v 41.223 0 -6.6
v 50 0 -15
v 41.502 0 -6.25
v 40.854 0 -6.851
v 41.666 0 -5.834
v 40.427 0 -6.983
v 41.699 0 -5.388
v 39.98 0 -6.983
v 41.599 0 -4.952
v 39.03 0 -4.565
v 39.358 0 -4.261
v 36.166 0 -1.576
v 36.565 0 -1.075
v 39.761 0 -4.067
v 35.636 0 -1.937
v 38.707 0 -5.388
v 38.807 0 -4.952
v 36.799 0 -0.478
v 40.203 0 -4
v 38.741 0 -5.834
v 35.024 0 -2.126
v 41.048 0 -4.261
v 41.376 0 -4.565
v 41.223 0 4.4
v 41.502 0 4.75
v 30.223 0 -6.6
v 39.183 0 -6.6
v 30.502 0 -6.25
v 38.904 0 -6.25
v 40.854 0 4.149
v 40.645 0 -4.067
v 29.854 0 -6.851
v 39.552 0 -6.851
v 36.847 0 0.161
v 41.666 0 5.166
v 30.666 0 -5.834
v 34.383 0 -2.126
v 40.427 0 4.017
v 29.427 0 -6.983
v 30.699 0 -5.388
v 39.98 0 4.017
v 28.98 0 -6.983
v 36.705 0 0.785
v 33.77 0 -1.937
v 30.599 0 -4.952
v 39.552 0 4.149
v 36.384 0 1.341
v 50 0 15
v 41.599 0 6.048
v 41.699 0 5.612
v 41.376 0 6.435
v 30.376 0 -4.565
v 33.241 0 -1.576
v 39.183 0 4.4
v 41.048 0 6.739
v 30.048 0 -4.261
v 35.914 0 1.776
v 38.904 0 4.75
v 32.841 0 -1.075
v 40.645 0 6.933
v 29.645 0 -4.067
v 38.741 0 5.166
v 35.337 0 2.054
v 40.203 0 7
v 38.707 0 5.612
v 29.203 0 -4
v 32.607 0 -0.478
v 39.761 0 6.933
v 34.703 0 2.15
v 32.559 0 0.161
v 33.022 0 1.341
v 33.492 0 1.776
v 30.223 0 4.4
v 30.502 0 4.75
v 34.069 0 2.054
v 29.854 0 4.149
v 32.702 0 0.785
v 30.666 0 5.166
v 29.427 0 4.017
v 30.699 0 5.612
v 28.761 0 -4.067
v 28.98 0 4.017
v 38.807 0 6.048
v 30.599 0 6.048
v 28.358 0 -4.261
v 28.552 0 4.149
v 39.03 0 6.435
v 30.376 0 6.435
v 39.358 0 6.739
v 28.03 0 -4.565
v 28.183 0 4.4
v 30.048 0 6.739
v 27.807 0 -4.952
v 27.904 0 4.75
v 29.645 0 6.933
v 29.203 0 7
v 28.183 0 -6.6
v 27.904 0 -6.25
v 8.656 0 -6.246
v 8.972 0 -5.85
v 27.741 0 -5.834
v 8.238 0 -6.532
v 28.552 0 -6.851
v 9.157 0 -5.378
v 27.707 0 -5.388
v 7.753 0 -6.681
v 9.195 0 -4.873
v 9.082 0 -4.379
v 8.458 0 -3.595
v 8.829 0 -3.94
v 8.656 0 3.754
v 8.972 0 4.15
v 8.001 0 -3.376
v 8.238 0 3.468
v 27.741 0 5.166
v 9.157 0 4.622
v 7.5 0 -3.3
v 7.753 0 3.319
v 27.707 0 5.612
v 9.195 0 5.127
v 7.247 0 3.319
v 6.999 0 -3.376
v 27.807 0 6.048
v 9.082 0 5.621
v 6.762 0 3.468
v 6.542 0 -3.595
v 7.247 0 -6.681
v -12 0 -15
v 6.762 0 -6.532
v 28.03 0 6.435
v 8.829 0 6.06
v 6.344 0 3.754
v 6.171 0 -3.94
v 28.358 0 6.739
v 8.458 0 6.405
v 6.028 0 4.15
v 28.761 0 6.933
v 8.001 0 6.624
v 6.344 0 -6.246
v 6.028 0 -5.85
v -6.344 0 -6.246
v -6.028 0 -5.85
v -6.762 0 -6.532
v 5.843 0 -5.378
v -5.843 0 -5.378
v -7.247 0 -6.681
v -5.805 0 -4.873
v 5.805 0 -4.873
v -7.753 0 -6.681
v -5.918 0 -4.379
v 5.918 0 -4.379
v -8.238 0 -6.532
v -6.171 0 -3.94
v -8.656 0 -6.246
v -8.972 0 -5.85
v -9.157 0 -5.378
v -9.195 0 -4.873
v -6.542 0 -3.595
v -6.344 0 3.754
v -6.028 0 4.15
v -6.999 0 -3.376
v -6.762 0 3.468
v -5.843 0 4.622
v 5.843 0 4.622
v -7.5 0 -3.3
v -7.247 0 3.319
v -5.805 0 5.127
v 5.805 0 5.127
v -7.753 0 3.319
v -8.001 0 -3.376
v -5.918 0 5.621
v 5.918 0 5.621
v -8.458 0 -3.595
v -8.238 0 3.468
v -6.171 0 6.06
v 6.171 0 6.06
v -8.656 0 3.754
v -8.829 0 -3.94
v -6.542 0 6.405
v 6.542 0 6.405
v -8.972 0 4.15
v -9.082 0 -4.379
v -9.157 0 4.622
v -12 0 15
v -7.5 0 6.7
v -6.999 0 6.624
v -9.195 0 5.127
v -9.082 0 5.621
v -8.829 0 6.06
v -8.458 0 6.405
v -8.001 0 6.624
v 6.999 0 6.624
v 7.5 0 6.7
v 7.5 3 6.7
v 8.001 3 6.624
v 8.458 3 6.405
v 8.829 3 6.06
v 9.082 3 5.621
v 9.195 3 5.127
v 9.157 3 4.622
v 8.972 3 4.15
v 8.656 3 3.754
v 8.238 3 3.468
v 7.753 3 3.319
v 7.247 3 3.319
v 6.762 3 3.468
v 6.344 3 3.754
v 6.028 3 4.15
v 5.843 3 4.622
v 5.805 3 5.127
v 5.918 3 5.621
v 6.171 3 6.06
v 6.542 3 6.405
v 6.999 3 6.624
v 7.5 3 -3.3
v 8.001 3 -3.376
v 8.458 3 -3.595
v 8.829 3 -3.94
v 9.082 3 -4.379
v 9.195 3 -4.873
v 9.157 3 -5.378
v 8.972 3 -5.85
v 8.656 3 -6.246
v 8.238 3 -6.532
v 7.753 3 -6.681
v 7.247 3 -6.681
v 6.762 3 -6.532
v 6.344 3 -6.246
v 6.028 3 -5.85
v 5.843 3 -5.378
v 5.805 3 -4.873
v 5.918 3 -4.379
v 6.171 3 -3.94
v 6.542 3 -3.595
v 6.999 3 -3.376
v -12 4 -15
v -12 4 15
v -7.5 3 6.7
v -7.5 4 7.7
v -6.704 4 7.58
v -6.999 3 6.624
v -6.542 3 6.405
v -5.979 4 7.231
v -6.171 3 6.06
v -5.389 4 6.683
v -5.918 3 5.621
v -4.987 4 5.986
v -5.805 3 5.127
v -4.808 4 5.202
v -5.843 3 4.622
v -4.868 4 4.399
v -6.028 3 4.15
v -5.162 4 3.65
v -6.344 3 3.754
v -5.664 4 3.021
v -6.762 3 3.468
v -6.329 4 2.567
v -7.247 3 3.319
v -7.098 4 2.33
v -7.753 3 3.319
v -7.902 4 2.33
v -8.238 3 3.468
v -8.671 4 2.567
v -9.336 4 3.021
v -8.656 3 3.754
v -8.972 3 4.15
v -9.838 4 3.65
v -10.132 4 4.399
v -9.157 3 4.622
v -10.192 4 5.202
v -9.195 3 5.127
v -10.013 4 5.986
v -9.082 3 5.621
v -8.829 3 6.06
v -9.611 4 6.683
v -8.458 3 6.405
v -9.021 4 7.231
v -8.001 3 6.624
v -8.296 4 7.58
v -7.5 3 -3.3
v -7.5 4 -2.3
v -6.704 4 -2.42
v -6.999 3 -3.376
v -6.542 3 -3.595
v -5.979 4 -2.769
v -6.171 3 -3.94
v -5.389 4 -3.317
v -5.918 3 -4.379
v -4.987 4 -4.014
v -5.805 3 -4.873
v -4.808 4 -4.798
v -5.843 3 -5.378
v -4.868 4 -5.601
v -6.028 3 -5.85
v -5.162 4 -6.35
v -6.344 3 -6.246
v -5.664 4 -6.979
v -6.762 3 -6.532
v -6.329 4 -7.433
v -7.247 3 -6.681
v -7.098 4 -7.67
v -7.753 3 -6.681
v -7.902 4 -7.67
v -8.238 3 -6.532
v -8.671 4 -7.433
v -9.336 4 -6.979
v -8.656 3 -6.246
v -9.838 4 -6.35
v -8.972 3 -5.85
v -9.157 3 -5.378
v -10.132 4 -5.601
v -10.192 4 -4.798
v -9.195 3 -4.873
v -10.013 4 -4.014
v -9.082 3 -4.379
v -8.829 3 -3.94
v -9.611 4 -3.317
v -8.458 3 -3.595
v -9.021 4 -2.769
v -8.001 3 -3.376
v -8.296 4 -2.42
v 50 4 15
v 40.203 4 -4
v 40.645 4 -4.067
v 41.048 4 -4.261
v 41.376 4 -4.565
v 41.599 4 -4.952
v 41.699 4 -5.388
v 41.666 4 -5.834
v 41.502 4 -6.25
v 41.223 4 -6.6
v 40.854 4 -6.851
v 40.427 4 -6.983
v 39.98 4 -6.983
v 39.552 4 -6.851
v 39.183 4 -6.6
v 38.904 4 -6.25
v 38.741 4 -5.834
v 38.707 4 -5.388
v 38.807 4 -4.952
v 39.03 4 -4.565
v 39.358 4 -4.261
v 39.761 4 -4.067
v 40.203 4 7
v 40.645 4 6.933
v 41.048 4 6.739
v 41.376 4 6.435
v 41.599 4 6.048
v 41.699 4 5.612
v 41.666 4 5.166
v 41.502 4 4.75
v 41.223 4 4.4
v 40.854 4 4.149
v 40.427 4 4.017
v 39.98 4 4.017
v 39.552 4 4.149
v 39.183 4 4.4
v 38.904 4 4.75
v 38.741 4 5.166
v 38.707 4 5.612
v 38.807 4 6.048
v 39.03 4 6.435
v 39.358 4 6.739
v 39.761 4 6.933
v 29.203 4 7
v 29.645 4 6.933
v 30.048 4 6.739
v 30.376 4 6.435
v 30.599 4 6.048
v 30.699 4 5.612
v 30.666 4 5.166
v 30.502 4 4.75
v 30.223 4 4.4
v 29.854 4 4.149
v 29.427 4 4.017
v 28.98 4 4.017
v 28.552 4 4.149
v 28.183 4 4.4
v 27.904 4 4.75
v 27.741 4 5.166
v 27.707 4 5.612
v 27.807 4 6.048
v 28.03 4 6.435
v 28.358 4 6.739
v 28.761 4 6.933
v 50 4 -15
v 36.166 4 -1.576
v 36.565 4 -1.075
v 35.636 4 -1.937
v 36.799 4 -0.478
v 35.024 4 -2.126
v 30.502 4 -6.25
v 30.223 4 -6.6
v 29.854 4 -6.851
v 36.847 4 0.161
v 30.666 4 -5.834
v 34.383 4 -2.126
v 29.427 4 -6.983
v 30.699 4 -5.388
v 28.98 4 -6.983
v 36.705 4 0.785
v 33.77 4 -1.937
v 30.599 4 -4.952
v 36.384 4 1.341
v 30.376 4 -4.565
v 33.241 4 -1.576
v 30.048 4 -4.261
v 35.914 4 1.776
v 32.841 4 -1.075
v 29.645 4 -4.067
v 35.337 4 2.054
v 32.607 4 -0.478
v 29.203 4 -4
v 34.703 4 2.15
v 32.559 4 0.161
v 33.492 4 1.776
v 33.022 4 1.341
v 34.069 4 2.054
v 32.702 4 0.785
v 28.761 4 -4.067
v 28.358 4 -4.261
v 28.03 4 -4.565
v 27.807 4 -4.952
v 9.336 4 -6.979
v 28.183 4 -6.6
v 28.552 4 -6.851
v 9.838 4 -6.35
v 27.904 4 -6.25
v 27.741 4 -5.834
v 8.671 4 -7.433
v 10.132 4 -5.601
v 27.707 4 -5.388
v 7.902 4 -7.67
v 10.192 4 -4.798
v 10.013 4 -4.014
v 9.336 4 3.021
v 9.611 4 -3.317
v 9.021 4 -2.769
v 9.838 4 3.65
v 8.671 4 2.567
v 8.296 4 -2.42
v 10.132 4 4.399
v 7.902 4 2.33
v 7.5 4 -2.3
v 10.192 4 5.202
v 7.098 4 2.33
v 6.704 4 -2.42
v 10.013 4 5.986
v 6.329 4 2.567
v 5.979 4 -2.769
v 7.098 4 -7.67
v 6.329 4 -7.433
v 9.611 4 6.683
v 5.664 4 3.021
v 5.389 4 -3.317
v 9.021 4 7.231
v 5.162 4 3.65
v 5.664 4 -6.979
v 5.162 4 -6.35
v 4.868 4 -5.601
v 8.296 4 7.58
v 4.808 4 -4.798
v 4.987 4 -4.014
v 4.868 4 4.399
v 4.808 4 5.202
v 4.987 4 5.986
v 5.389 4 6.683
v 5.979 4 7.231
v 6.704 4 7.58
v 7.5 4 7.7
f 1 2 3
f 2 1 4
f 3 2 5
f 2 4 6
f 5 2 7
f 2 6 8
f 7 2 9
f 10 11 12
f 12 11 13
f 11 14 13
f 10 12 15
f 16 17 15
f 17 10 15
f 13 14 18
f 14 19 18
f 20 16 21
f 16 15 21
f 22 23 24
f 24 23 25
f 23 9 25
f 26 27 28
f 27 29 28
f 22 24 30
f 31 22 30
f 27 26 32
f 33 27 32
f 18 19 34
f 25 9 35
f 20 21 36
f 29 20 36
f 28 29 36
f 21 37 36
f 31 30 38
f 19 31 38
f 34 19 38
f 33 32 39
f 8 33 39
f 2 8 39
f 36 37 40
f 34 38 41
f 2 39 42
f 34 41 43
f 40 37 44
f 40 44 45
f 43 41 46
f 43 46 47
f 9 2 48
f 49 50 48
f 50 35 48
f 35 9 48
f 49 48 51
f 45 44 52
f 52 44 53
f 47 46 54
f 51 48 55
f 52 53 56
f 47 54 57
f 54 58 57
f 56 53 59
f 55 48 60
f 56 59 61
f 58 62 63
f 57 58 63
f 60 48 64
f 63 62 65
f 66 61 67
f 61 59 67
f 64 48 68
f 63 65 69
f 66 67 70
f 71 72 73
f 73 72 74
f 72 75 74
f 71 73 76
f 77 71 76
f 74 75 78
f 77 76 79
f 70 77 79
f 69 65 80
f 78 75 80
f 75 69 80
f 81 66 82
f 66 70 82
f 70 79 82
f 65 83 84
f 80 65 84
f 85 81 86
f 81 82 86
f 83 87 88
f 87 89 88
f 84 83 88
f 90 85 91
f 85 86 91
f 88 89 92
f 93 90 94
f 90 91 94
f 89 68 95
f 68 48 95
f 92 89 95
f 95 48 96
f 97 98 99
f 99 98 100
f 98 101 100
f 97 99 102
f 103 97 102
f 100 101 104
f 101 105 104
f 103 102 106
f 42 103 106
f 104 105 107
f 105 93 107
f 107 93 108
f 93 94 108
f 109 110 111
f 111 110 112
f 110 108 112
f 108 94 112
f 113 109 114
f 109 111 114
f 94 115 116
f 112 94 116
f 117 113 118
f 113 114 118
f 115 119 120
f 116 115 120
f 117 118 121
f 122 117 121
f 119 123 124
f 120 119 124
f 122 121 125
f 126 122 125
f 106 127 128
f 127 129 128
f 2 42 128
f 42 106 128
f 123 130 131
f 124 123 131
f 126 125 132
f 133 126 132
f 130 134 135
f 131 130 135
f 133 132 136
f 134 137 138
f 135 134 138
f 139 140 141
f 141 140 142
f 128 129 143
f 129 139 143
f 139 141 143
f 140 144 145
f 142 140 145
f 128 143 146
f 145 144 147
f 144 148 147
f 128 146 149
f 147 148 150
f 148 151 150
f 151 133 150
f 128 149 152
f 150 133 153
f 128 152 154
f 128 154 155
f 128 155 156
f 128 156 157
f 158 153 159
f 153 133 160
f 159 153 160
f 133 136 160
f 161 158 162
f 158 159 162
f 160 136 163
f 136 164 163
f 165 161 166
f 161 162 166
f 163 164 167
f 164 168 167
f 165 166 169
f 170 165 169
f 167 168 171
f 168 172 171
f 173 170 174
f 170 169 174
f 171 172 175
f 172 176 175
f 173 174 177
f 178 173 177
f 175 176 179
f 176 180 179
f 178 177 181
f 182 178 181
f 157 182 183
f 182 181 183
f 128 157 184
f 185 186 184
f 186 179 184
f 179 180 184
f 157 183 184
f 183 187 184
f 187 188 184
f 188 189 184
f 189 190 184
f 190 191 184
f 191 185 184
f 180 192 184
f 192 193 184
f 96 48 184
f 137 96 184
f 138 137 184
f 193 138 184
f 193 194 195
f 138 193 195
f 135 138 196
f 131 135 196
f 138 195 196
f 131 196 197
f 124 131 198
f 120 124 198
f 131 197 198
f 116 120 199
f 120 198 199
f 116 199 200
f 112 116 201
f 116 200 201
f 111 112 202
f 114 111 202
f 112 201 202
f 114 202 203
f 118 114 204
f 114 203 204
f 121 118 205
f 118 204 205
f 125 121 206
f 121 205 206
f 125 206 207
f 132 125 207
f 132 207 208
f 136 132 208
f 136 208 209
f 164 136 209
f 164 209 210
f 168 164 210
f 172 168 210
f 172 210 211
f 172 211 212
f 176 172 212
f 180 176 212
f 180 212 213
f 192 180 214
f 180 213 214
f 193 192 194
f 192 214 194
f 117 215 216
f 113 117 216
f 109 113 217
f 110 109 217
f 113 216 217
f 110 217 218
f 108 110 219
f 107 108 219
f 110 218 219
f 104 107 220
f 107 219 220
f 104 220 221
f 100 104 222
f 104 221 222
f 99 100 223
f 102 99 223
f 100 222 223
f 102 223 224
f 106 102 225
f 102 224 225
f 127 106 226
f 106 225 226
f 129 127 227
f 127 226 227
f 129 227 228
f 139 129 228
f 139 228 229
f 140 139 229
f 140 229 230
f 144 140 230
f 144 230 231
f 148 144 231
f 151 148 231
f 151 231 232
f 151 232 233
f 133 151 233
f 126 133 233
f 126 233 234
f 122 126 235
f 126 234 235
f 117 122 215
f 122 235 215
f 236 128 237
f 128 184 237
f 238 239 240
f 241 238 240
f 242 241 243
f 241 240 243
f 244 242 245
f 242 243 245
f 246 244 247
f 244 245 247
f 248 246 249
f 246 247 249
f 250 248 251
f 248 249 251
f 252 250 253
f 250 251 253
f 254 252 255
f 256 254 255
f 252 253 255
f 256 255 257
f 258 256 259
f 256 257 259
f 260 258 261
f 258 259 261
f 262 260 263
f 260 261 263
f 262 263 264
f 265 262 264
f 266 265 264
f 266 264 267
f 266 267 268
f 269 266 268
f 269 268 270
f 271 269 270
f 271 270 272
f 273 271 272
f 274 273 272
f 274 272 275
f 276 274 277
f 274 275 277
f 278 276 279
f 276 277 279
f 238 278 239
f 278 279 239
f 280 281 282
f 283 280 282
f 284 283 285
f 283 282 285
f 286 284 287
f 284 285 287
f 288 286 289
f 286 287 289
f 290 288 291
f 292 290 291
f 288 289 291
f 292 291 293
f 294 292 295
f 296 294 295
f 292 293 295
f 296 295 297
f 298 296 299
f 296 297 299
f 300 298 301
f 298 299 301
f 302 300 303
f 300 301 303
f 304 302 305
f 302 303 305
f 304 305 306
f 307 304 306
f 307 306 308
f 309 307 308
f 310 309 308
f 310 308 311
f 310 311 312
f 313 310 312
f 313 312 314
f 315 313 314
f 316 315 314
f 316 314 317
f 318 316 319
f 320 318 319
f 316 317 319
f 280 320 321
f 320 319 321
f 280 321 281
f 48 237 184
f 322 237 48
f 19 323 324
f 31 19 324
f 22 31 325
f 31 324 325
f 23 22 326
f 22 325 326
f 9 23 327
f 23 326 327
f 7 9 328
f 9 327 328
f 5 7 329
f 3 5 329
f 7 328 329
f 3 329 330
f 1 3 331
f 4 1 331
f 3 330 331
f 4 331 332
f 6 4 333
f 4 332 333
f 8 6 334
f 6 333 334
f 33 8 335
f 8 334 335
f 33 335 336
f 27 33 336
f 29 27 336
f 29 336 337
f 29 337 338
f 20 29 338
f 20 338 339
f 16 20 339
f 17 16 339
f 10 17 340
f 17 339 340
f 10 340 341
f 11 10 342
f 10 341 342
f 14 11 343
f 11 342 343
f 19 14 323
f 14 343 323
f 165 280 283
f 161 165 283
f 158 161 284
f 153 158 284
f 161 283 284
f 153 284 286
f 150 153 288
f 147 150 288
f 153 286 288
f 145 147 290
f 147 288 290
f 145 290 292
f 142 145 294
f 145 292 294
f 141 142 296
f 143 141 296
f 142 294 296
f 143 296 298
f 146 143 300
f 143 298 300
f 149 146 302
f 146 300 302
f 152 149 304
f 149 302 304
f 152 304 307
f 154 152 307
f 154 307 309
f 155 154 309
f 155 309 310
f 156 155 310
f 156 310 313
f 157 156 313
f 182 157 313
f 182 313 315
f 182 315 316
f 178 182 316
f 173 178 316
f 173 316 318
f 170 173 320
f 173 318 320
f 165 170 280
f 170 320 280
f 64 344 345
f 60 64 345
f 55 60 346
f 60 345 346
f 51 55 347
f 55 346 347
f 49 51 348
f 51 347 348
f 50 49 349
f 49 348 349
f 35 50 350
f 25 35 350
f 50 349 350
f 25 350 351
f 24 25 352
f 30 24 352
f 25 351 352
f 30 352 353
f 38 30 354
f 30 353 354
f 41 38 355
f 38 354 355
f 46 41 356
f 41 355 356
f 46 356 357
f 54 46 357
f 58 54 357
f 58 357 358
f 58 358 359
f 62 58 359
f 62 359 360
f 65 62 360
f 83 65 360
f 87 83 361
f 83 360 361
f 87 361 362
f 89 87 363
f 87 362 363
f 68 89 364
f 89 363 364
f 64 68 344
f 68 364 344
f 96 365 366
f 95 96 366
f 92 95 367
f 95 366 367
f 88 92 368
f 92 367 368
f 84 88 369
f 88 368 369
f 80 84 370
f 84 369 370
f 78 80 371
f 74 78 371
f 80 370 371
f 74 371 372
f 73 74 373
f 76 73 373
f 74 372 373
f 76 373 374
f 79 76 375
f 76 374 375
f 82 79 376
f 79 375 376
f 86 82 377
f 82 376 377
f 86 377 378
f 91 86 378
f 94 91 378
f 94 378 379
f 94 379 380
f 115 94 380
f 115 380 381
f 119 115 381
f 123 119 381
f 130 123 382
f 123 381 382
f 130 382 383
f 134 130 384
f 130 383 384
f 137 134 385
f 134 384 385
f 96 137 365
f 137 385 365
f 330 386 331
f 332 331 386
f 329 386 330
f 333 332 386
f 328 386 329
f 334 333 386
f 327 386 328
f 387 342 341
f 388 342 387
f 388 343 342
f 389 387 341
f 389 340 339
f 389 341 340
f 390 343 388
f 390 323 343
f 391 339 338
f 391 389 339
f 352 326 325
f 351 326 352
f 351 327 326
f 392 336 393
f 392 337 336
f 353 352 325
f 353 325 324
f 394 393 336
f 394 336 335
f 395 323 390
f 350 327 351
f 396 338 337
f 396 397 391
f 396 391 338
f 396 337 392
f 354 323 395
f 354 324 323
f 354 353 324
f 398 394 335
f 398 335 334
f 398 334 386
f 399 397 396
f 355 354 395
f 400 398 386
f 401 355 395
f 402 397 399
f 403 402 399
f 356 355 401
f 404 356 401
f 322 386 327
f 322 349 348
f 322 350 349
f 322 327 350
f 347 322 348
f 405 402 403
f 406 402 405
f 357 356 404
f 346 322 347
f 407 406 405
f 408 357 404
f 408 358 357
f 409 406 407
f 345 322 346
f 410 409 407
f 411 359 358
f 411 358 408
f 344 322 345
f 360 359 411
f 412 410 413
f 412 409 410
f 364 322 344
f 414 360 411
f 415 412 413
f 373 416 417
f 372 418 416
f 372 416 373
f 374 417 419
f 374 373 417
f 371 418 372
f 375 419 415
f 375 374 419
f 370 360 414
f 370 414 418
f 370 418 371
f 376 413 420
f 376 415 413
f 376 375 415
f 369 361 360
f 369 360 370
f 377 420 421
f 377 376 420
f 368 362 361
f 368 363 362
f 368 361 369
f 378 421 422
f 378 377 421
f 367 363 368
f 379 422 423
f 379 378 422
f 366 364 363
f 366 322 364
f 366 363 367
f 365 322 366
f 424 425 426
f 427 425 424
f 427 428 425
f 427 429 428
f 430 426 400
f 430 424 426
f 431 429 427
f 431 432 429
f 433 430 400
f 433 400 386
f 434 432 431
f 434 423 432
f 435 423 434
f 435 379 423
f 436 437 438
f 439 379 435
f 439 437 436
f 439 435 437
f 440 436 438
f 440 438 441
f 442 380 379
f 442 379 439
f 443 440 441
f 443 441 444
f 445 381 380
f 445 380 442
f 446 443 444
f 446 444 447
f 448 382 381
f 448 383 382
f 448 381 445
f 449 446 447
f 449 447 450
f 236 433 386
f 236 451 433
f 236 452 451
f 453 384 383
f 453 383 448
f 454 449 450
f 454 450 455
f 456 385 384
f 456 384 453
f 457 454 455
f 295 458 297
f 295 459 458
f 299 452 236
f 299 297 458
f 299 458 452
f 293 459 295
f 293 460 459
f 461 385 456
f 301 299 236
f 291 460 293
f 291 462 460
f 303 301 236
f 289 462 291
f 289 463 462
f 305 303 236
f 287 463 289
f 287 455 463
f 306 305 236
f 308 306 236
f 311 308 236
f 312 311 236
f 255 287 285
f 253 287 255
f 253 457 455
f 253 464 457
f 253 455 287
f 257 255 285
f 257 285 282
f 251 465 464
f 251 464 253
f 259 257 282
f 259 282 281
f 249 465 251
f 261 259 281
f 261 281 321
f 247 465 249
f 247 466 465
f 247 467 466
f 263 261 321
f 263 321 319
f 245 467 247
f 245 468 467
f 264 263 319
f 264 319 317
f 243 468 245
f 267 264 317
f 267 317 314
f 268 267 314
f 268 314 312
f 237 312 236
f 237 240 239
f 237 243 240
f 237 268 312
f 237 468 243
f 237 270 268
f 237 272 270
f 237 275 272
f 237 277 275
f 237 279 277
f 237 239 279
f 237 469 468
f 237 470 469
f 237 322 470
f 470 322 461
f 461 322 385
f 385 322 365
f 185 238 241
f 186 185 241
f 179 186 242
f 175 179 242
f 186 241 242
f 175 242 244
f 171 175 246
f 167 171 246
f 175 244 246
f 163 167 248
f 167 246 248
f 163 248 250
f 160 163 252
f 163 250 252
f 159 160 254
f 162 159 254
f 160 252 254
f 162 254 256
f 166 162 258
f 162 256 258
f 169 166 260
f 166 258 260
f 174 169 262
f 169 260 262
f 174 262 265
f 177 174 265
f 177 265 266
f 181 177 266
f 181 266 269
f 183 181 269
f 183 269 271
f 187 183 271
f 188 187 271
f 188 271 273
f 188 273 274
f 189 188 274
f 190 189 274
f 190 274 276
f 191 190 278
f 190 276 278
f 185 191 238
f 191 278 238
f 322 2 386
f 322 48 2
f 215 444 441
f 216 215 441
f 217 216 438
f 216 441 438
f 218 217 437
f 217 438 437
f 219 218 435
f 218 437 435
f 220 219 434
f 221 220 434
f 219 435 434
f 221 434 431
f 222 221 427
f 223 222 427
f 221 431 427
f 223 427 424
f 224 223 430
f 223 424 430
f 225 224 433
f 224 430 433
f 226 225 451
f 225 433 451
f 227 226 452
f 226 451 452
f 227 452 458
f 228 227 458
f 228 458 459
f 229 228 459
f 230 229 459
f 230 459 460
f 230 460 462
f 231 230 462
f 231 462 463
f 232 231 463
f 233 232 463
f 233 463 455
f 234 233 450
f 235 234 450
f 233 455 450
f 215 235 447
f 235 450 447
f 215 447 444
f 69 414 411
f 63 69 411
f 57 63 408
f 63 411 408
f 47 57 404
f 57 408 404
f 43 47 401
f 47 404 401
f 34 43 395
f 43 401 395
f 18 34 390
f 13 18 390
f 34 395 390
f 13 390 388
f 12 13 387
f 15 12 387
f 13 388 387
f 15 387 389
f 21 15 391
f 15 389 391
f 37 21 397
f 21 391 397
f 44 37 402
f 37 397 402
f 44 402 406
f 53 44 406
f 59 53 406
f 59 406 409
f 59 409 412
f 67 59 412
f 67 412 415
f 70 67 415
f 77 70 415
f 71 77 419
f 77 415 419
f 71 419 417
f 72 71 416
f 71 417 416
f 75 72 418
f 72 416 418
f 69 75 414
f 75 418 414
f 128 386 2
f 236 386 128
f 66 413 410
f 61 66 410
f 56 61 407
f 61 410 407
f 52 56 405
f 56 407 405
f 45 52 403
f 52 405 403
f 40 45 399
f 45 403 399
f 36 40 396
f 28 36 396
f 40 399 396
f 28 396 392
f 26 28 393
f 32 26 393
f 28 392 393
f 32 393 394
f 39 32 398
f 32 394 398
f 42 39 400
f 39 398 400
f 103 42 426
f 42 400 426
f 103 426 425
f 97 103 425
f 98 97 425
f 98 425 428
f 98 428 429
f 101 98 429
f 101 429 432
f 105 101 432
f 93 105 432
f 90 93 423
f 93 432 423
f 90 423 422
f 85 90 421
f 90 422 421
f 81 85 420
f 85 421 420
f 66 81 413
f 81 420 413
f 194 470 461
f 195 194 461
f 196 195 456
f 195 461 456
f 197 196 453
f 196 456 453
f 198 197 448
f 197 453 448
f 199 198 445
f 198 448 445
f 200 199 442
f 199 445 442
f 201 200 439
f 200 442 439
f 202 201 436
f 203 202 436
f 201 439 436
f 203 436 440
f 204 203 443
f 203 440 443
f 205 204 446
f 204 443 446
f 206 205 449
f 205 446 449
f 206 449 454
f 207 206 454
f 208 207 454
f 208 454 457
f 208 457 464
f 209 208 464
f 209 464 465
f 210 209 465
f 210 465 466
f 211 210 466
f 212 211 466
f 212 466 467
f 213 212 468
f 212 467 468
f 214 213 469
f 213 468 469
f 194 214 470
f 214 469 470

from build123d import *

# Parameters (mm, degrees)
SKETCH1_W           = 20
SKETCH1_H           = 28
BOSS_EXTRUDE1_DEPTH = 4
SKETCH2_R           = 1.7
CUT_EXTRUDE1_DEPTH  = 4
SKETCH6_W           = 40
SKETCH6_H           = 28
BOSS_EXTRUDE2_DEPTH = 4
SKETCH7_W           = 2
SKETCH7_H           = 28
BOSS_EXTRUDE3_DEPTH = 4
CHAMFER2_SIZE       = 1
SKETCH8_R           = 2.15
SKETCH8_R_2         = 1.5
CUT_EXTRUDE2_DEPTH  = 4
SKETCH12_W          = 62
SKETCH12_H          = 4
BOSS_EXTRUDE4_DEPTH = 1
SKETCH13_W          = 62
SKETCH13_H          = 4
BOSS_EXTRUDE5_DEPTH = 1


with BuildPart() as part:
    # Sketch1 → Boss-Extrude1 (new body)
    with BuildSketch(Plane(origin=(0, 0, 0), x_dir=(1, 0, 0), z_dir=(0, 1, 0))):
        Rectangle(SKETCH1_W, SKETCH1_H)
    extrude(amount=BOSS_EXTRUDE1_DEPTH)

    # Sketch2 → Cut-Extrude1 (cut)
    with BuildSketch(Plane(origin=(0, 4, 0), x_dir=(1, 0, 0), z_dir=(0, 1, 0))):
        with Locations(Location((-7.5, 5, 0), (0, 0, 270))):
            Circle(SKETCH2_R)
        with Locations(Location((-7.5, -5, 0), (0, 0, 270))):
            Circle(SKETCH2_R)
        with Locations(Location((7.5, -5, 0), (0, 0, 270))):
            Circle(SKETCH2_R)
        with Locations(Location((7.5, 5, 0), (0, 0, 270))):
            Circle(SKETCH2_R)
    extrude(amount=-CUT_EXTRUDE1_DEPTH, mode=Mode.SUBTRACT)

    # Sketch6 → Boss-Extrude2 (add)
    with BuildSketch(Plane(origin=(0, 4, 0), x_dir=(1, 0, 0), z_dir=(0, 1, 0))):
        with Locations((30, 0)):
            Rectangle(SKETCH6_W, SKETCH6_H)
    extrude(amount=-BOSS_EXTRUDE2_DEPTH)

    # Sketch7 → Boss-Extrude3 (add)
    with BuildSketch(Plane(origin=(0, 4, 0), x_dir=(1, 0, 0), z_dir=(0, 1, 0))):
        with Locations((-11, 0)):
            Rectangle(SKETCH7_W, SKETCH7_H)
    extrude(amount=-BOSS_EXTRUDE3_DEPTH)

    # Chamfer2
    chamfer2_edges = [part.edges().sort_by_distance(p)[0] for p in [
        (-7.5, 4, 3.3),
        (7.5, 4, -6.7),
        (-7.5, 4, -6.7),
        (7.5, 4, 3.3),
    ]]
    chamfer(chamfer2_edges, length=CHAMFER2_SIZE)

    # Sketch8 → Cut-Extrude2 (cut)
    with BuildSketch(Plane(origin=(0, 4, 0), x_dir=(1, 0, 0), z_dir=(0, 1, 0))):
        with Locations(Location((34.703187254, 0, 0), (0, 0, 270))):
            Circle(SKETCH8_R)
        with Locations(Location((29.203187254, 5.5, 0), (0, 0, 270))):
            Circle(SKETCH8_R_2)
        with Locations(Location((40.203187254, 5.5, 0), (0, 0, 270))):
            Circle(SKETCH8_R_2)
        with Locations(Location((40.203187254, -5.5, 0), (0, 0, 270))):
            Circle(SKETCH8_R_2)
        with Locations(Location((29.203187254, -5.5, 0), (0, 0, 270))):
            Circle(SKETCH8_R_2)
    extrude(amount=-CUT_EXTRUDE2_DEPTH, mode=Mode.SUBTRACT)

    # Sketch12 → Boss-Extrude4 (add)
    with BuildSketch(Plane.XY.offset(14)):
        with Locations((19, 2)):
            Rectangle(SKETCH12_W, SKETCH12_H)
    extrude(amount=BOSS_EXTRUDE4_DEPTH)

    # Sketch13 → Boss-Extrude5 (add)
    with BuildSketch(Plane(origin=(0, 0, -14), x_dir=(-1, 0, 0), z_dir=(0, 0, -1))):
        with Locations((-19, 2)):
            Rectangle(SKETCH13_W, SKETCH13_H)
    extrude(amount=BOSS_EXTRUDE5_DEPTH)


solid = part.part
